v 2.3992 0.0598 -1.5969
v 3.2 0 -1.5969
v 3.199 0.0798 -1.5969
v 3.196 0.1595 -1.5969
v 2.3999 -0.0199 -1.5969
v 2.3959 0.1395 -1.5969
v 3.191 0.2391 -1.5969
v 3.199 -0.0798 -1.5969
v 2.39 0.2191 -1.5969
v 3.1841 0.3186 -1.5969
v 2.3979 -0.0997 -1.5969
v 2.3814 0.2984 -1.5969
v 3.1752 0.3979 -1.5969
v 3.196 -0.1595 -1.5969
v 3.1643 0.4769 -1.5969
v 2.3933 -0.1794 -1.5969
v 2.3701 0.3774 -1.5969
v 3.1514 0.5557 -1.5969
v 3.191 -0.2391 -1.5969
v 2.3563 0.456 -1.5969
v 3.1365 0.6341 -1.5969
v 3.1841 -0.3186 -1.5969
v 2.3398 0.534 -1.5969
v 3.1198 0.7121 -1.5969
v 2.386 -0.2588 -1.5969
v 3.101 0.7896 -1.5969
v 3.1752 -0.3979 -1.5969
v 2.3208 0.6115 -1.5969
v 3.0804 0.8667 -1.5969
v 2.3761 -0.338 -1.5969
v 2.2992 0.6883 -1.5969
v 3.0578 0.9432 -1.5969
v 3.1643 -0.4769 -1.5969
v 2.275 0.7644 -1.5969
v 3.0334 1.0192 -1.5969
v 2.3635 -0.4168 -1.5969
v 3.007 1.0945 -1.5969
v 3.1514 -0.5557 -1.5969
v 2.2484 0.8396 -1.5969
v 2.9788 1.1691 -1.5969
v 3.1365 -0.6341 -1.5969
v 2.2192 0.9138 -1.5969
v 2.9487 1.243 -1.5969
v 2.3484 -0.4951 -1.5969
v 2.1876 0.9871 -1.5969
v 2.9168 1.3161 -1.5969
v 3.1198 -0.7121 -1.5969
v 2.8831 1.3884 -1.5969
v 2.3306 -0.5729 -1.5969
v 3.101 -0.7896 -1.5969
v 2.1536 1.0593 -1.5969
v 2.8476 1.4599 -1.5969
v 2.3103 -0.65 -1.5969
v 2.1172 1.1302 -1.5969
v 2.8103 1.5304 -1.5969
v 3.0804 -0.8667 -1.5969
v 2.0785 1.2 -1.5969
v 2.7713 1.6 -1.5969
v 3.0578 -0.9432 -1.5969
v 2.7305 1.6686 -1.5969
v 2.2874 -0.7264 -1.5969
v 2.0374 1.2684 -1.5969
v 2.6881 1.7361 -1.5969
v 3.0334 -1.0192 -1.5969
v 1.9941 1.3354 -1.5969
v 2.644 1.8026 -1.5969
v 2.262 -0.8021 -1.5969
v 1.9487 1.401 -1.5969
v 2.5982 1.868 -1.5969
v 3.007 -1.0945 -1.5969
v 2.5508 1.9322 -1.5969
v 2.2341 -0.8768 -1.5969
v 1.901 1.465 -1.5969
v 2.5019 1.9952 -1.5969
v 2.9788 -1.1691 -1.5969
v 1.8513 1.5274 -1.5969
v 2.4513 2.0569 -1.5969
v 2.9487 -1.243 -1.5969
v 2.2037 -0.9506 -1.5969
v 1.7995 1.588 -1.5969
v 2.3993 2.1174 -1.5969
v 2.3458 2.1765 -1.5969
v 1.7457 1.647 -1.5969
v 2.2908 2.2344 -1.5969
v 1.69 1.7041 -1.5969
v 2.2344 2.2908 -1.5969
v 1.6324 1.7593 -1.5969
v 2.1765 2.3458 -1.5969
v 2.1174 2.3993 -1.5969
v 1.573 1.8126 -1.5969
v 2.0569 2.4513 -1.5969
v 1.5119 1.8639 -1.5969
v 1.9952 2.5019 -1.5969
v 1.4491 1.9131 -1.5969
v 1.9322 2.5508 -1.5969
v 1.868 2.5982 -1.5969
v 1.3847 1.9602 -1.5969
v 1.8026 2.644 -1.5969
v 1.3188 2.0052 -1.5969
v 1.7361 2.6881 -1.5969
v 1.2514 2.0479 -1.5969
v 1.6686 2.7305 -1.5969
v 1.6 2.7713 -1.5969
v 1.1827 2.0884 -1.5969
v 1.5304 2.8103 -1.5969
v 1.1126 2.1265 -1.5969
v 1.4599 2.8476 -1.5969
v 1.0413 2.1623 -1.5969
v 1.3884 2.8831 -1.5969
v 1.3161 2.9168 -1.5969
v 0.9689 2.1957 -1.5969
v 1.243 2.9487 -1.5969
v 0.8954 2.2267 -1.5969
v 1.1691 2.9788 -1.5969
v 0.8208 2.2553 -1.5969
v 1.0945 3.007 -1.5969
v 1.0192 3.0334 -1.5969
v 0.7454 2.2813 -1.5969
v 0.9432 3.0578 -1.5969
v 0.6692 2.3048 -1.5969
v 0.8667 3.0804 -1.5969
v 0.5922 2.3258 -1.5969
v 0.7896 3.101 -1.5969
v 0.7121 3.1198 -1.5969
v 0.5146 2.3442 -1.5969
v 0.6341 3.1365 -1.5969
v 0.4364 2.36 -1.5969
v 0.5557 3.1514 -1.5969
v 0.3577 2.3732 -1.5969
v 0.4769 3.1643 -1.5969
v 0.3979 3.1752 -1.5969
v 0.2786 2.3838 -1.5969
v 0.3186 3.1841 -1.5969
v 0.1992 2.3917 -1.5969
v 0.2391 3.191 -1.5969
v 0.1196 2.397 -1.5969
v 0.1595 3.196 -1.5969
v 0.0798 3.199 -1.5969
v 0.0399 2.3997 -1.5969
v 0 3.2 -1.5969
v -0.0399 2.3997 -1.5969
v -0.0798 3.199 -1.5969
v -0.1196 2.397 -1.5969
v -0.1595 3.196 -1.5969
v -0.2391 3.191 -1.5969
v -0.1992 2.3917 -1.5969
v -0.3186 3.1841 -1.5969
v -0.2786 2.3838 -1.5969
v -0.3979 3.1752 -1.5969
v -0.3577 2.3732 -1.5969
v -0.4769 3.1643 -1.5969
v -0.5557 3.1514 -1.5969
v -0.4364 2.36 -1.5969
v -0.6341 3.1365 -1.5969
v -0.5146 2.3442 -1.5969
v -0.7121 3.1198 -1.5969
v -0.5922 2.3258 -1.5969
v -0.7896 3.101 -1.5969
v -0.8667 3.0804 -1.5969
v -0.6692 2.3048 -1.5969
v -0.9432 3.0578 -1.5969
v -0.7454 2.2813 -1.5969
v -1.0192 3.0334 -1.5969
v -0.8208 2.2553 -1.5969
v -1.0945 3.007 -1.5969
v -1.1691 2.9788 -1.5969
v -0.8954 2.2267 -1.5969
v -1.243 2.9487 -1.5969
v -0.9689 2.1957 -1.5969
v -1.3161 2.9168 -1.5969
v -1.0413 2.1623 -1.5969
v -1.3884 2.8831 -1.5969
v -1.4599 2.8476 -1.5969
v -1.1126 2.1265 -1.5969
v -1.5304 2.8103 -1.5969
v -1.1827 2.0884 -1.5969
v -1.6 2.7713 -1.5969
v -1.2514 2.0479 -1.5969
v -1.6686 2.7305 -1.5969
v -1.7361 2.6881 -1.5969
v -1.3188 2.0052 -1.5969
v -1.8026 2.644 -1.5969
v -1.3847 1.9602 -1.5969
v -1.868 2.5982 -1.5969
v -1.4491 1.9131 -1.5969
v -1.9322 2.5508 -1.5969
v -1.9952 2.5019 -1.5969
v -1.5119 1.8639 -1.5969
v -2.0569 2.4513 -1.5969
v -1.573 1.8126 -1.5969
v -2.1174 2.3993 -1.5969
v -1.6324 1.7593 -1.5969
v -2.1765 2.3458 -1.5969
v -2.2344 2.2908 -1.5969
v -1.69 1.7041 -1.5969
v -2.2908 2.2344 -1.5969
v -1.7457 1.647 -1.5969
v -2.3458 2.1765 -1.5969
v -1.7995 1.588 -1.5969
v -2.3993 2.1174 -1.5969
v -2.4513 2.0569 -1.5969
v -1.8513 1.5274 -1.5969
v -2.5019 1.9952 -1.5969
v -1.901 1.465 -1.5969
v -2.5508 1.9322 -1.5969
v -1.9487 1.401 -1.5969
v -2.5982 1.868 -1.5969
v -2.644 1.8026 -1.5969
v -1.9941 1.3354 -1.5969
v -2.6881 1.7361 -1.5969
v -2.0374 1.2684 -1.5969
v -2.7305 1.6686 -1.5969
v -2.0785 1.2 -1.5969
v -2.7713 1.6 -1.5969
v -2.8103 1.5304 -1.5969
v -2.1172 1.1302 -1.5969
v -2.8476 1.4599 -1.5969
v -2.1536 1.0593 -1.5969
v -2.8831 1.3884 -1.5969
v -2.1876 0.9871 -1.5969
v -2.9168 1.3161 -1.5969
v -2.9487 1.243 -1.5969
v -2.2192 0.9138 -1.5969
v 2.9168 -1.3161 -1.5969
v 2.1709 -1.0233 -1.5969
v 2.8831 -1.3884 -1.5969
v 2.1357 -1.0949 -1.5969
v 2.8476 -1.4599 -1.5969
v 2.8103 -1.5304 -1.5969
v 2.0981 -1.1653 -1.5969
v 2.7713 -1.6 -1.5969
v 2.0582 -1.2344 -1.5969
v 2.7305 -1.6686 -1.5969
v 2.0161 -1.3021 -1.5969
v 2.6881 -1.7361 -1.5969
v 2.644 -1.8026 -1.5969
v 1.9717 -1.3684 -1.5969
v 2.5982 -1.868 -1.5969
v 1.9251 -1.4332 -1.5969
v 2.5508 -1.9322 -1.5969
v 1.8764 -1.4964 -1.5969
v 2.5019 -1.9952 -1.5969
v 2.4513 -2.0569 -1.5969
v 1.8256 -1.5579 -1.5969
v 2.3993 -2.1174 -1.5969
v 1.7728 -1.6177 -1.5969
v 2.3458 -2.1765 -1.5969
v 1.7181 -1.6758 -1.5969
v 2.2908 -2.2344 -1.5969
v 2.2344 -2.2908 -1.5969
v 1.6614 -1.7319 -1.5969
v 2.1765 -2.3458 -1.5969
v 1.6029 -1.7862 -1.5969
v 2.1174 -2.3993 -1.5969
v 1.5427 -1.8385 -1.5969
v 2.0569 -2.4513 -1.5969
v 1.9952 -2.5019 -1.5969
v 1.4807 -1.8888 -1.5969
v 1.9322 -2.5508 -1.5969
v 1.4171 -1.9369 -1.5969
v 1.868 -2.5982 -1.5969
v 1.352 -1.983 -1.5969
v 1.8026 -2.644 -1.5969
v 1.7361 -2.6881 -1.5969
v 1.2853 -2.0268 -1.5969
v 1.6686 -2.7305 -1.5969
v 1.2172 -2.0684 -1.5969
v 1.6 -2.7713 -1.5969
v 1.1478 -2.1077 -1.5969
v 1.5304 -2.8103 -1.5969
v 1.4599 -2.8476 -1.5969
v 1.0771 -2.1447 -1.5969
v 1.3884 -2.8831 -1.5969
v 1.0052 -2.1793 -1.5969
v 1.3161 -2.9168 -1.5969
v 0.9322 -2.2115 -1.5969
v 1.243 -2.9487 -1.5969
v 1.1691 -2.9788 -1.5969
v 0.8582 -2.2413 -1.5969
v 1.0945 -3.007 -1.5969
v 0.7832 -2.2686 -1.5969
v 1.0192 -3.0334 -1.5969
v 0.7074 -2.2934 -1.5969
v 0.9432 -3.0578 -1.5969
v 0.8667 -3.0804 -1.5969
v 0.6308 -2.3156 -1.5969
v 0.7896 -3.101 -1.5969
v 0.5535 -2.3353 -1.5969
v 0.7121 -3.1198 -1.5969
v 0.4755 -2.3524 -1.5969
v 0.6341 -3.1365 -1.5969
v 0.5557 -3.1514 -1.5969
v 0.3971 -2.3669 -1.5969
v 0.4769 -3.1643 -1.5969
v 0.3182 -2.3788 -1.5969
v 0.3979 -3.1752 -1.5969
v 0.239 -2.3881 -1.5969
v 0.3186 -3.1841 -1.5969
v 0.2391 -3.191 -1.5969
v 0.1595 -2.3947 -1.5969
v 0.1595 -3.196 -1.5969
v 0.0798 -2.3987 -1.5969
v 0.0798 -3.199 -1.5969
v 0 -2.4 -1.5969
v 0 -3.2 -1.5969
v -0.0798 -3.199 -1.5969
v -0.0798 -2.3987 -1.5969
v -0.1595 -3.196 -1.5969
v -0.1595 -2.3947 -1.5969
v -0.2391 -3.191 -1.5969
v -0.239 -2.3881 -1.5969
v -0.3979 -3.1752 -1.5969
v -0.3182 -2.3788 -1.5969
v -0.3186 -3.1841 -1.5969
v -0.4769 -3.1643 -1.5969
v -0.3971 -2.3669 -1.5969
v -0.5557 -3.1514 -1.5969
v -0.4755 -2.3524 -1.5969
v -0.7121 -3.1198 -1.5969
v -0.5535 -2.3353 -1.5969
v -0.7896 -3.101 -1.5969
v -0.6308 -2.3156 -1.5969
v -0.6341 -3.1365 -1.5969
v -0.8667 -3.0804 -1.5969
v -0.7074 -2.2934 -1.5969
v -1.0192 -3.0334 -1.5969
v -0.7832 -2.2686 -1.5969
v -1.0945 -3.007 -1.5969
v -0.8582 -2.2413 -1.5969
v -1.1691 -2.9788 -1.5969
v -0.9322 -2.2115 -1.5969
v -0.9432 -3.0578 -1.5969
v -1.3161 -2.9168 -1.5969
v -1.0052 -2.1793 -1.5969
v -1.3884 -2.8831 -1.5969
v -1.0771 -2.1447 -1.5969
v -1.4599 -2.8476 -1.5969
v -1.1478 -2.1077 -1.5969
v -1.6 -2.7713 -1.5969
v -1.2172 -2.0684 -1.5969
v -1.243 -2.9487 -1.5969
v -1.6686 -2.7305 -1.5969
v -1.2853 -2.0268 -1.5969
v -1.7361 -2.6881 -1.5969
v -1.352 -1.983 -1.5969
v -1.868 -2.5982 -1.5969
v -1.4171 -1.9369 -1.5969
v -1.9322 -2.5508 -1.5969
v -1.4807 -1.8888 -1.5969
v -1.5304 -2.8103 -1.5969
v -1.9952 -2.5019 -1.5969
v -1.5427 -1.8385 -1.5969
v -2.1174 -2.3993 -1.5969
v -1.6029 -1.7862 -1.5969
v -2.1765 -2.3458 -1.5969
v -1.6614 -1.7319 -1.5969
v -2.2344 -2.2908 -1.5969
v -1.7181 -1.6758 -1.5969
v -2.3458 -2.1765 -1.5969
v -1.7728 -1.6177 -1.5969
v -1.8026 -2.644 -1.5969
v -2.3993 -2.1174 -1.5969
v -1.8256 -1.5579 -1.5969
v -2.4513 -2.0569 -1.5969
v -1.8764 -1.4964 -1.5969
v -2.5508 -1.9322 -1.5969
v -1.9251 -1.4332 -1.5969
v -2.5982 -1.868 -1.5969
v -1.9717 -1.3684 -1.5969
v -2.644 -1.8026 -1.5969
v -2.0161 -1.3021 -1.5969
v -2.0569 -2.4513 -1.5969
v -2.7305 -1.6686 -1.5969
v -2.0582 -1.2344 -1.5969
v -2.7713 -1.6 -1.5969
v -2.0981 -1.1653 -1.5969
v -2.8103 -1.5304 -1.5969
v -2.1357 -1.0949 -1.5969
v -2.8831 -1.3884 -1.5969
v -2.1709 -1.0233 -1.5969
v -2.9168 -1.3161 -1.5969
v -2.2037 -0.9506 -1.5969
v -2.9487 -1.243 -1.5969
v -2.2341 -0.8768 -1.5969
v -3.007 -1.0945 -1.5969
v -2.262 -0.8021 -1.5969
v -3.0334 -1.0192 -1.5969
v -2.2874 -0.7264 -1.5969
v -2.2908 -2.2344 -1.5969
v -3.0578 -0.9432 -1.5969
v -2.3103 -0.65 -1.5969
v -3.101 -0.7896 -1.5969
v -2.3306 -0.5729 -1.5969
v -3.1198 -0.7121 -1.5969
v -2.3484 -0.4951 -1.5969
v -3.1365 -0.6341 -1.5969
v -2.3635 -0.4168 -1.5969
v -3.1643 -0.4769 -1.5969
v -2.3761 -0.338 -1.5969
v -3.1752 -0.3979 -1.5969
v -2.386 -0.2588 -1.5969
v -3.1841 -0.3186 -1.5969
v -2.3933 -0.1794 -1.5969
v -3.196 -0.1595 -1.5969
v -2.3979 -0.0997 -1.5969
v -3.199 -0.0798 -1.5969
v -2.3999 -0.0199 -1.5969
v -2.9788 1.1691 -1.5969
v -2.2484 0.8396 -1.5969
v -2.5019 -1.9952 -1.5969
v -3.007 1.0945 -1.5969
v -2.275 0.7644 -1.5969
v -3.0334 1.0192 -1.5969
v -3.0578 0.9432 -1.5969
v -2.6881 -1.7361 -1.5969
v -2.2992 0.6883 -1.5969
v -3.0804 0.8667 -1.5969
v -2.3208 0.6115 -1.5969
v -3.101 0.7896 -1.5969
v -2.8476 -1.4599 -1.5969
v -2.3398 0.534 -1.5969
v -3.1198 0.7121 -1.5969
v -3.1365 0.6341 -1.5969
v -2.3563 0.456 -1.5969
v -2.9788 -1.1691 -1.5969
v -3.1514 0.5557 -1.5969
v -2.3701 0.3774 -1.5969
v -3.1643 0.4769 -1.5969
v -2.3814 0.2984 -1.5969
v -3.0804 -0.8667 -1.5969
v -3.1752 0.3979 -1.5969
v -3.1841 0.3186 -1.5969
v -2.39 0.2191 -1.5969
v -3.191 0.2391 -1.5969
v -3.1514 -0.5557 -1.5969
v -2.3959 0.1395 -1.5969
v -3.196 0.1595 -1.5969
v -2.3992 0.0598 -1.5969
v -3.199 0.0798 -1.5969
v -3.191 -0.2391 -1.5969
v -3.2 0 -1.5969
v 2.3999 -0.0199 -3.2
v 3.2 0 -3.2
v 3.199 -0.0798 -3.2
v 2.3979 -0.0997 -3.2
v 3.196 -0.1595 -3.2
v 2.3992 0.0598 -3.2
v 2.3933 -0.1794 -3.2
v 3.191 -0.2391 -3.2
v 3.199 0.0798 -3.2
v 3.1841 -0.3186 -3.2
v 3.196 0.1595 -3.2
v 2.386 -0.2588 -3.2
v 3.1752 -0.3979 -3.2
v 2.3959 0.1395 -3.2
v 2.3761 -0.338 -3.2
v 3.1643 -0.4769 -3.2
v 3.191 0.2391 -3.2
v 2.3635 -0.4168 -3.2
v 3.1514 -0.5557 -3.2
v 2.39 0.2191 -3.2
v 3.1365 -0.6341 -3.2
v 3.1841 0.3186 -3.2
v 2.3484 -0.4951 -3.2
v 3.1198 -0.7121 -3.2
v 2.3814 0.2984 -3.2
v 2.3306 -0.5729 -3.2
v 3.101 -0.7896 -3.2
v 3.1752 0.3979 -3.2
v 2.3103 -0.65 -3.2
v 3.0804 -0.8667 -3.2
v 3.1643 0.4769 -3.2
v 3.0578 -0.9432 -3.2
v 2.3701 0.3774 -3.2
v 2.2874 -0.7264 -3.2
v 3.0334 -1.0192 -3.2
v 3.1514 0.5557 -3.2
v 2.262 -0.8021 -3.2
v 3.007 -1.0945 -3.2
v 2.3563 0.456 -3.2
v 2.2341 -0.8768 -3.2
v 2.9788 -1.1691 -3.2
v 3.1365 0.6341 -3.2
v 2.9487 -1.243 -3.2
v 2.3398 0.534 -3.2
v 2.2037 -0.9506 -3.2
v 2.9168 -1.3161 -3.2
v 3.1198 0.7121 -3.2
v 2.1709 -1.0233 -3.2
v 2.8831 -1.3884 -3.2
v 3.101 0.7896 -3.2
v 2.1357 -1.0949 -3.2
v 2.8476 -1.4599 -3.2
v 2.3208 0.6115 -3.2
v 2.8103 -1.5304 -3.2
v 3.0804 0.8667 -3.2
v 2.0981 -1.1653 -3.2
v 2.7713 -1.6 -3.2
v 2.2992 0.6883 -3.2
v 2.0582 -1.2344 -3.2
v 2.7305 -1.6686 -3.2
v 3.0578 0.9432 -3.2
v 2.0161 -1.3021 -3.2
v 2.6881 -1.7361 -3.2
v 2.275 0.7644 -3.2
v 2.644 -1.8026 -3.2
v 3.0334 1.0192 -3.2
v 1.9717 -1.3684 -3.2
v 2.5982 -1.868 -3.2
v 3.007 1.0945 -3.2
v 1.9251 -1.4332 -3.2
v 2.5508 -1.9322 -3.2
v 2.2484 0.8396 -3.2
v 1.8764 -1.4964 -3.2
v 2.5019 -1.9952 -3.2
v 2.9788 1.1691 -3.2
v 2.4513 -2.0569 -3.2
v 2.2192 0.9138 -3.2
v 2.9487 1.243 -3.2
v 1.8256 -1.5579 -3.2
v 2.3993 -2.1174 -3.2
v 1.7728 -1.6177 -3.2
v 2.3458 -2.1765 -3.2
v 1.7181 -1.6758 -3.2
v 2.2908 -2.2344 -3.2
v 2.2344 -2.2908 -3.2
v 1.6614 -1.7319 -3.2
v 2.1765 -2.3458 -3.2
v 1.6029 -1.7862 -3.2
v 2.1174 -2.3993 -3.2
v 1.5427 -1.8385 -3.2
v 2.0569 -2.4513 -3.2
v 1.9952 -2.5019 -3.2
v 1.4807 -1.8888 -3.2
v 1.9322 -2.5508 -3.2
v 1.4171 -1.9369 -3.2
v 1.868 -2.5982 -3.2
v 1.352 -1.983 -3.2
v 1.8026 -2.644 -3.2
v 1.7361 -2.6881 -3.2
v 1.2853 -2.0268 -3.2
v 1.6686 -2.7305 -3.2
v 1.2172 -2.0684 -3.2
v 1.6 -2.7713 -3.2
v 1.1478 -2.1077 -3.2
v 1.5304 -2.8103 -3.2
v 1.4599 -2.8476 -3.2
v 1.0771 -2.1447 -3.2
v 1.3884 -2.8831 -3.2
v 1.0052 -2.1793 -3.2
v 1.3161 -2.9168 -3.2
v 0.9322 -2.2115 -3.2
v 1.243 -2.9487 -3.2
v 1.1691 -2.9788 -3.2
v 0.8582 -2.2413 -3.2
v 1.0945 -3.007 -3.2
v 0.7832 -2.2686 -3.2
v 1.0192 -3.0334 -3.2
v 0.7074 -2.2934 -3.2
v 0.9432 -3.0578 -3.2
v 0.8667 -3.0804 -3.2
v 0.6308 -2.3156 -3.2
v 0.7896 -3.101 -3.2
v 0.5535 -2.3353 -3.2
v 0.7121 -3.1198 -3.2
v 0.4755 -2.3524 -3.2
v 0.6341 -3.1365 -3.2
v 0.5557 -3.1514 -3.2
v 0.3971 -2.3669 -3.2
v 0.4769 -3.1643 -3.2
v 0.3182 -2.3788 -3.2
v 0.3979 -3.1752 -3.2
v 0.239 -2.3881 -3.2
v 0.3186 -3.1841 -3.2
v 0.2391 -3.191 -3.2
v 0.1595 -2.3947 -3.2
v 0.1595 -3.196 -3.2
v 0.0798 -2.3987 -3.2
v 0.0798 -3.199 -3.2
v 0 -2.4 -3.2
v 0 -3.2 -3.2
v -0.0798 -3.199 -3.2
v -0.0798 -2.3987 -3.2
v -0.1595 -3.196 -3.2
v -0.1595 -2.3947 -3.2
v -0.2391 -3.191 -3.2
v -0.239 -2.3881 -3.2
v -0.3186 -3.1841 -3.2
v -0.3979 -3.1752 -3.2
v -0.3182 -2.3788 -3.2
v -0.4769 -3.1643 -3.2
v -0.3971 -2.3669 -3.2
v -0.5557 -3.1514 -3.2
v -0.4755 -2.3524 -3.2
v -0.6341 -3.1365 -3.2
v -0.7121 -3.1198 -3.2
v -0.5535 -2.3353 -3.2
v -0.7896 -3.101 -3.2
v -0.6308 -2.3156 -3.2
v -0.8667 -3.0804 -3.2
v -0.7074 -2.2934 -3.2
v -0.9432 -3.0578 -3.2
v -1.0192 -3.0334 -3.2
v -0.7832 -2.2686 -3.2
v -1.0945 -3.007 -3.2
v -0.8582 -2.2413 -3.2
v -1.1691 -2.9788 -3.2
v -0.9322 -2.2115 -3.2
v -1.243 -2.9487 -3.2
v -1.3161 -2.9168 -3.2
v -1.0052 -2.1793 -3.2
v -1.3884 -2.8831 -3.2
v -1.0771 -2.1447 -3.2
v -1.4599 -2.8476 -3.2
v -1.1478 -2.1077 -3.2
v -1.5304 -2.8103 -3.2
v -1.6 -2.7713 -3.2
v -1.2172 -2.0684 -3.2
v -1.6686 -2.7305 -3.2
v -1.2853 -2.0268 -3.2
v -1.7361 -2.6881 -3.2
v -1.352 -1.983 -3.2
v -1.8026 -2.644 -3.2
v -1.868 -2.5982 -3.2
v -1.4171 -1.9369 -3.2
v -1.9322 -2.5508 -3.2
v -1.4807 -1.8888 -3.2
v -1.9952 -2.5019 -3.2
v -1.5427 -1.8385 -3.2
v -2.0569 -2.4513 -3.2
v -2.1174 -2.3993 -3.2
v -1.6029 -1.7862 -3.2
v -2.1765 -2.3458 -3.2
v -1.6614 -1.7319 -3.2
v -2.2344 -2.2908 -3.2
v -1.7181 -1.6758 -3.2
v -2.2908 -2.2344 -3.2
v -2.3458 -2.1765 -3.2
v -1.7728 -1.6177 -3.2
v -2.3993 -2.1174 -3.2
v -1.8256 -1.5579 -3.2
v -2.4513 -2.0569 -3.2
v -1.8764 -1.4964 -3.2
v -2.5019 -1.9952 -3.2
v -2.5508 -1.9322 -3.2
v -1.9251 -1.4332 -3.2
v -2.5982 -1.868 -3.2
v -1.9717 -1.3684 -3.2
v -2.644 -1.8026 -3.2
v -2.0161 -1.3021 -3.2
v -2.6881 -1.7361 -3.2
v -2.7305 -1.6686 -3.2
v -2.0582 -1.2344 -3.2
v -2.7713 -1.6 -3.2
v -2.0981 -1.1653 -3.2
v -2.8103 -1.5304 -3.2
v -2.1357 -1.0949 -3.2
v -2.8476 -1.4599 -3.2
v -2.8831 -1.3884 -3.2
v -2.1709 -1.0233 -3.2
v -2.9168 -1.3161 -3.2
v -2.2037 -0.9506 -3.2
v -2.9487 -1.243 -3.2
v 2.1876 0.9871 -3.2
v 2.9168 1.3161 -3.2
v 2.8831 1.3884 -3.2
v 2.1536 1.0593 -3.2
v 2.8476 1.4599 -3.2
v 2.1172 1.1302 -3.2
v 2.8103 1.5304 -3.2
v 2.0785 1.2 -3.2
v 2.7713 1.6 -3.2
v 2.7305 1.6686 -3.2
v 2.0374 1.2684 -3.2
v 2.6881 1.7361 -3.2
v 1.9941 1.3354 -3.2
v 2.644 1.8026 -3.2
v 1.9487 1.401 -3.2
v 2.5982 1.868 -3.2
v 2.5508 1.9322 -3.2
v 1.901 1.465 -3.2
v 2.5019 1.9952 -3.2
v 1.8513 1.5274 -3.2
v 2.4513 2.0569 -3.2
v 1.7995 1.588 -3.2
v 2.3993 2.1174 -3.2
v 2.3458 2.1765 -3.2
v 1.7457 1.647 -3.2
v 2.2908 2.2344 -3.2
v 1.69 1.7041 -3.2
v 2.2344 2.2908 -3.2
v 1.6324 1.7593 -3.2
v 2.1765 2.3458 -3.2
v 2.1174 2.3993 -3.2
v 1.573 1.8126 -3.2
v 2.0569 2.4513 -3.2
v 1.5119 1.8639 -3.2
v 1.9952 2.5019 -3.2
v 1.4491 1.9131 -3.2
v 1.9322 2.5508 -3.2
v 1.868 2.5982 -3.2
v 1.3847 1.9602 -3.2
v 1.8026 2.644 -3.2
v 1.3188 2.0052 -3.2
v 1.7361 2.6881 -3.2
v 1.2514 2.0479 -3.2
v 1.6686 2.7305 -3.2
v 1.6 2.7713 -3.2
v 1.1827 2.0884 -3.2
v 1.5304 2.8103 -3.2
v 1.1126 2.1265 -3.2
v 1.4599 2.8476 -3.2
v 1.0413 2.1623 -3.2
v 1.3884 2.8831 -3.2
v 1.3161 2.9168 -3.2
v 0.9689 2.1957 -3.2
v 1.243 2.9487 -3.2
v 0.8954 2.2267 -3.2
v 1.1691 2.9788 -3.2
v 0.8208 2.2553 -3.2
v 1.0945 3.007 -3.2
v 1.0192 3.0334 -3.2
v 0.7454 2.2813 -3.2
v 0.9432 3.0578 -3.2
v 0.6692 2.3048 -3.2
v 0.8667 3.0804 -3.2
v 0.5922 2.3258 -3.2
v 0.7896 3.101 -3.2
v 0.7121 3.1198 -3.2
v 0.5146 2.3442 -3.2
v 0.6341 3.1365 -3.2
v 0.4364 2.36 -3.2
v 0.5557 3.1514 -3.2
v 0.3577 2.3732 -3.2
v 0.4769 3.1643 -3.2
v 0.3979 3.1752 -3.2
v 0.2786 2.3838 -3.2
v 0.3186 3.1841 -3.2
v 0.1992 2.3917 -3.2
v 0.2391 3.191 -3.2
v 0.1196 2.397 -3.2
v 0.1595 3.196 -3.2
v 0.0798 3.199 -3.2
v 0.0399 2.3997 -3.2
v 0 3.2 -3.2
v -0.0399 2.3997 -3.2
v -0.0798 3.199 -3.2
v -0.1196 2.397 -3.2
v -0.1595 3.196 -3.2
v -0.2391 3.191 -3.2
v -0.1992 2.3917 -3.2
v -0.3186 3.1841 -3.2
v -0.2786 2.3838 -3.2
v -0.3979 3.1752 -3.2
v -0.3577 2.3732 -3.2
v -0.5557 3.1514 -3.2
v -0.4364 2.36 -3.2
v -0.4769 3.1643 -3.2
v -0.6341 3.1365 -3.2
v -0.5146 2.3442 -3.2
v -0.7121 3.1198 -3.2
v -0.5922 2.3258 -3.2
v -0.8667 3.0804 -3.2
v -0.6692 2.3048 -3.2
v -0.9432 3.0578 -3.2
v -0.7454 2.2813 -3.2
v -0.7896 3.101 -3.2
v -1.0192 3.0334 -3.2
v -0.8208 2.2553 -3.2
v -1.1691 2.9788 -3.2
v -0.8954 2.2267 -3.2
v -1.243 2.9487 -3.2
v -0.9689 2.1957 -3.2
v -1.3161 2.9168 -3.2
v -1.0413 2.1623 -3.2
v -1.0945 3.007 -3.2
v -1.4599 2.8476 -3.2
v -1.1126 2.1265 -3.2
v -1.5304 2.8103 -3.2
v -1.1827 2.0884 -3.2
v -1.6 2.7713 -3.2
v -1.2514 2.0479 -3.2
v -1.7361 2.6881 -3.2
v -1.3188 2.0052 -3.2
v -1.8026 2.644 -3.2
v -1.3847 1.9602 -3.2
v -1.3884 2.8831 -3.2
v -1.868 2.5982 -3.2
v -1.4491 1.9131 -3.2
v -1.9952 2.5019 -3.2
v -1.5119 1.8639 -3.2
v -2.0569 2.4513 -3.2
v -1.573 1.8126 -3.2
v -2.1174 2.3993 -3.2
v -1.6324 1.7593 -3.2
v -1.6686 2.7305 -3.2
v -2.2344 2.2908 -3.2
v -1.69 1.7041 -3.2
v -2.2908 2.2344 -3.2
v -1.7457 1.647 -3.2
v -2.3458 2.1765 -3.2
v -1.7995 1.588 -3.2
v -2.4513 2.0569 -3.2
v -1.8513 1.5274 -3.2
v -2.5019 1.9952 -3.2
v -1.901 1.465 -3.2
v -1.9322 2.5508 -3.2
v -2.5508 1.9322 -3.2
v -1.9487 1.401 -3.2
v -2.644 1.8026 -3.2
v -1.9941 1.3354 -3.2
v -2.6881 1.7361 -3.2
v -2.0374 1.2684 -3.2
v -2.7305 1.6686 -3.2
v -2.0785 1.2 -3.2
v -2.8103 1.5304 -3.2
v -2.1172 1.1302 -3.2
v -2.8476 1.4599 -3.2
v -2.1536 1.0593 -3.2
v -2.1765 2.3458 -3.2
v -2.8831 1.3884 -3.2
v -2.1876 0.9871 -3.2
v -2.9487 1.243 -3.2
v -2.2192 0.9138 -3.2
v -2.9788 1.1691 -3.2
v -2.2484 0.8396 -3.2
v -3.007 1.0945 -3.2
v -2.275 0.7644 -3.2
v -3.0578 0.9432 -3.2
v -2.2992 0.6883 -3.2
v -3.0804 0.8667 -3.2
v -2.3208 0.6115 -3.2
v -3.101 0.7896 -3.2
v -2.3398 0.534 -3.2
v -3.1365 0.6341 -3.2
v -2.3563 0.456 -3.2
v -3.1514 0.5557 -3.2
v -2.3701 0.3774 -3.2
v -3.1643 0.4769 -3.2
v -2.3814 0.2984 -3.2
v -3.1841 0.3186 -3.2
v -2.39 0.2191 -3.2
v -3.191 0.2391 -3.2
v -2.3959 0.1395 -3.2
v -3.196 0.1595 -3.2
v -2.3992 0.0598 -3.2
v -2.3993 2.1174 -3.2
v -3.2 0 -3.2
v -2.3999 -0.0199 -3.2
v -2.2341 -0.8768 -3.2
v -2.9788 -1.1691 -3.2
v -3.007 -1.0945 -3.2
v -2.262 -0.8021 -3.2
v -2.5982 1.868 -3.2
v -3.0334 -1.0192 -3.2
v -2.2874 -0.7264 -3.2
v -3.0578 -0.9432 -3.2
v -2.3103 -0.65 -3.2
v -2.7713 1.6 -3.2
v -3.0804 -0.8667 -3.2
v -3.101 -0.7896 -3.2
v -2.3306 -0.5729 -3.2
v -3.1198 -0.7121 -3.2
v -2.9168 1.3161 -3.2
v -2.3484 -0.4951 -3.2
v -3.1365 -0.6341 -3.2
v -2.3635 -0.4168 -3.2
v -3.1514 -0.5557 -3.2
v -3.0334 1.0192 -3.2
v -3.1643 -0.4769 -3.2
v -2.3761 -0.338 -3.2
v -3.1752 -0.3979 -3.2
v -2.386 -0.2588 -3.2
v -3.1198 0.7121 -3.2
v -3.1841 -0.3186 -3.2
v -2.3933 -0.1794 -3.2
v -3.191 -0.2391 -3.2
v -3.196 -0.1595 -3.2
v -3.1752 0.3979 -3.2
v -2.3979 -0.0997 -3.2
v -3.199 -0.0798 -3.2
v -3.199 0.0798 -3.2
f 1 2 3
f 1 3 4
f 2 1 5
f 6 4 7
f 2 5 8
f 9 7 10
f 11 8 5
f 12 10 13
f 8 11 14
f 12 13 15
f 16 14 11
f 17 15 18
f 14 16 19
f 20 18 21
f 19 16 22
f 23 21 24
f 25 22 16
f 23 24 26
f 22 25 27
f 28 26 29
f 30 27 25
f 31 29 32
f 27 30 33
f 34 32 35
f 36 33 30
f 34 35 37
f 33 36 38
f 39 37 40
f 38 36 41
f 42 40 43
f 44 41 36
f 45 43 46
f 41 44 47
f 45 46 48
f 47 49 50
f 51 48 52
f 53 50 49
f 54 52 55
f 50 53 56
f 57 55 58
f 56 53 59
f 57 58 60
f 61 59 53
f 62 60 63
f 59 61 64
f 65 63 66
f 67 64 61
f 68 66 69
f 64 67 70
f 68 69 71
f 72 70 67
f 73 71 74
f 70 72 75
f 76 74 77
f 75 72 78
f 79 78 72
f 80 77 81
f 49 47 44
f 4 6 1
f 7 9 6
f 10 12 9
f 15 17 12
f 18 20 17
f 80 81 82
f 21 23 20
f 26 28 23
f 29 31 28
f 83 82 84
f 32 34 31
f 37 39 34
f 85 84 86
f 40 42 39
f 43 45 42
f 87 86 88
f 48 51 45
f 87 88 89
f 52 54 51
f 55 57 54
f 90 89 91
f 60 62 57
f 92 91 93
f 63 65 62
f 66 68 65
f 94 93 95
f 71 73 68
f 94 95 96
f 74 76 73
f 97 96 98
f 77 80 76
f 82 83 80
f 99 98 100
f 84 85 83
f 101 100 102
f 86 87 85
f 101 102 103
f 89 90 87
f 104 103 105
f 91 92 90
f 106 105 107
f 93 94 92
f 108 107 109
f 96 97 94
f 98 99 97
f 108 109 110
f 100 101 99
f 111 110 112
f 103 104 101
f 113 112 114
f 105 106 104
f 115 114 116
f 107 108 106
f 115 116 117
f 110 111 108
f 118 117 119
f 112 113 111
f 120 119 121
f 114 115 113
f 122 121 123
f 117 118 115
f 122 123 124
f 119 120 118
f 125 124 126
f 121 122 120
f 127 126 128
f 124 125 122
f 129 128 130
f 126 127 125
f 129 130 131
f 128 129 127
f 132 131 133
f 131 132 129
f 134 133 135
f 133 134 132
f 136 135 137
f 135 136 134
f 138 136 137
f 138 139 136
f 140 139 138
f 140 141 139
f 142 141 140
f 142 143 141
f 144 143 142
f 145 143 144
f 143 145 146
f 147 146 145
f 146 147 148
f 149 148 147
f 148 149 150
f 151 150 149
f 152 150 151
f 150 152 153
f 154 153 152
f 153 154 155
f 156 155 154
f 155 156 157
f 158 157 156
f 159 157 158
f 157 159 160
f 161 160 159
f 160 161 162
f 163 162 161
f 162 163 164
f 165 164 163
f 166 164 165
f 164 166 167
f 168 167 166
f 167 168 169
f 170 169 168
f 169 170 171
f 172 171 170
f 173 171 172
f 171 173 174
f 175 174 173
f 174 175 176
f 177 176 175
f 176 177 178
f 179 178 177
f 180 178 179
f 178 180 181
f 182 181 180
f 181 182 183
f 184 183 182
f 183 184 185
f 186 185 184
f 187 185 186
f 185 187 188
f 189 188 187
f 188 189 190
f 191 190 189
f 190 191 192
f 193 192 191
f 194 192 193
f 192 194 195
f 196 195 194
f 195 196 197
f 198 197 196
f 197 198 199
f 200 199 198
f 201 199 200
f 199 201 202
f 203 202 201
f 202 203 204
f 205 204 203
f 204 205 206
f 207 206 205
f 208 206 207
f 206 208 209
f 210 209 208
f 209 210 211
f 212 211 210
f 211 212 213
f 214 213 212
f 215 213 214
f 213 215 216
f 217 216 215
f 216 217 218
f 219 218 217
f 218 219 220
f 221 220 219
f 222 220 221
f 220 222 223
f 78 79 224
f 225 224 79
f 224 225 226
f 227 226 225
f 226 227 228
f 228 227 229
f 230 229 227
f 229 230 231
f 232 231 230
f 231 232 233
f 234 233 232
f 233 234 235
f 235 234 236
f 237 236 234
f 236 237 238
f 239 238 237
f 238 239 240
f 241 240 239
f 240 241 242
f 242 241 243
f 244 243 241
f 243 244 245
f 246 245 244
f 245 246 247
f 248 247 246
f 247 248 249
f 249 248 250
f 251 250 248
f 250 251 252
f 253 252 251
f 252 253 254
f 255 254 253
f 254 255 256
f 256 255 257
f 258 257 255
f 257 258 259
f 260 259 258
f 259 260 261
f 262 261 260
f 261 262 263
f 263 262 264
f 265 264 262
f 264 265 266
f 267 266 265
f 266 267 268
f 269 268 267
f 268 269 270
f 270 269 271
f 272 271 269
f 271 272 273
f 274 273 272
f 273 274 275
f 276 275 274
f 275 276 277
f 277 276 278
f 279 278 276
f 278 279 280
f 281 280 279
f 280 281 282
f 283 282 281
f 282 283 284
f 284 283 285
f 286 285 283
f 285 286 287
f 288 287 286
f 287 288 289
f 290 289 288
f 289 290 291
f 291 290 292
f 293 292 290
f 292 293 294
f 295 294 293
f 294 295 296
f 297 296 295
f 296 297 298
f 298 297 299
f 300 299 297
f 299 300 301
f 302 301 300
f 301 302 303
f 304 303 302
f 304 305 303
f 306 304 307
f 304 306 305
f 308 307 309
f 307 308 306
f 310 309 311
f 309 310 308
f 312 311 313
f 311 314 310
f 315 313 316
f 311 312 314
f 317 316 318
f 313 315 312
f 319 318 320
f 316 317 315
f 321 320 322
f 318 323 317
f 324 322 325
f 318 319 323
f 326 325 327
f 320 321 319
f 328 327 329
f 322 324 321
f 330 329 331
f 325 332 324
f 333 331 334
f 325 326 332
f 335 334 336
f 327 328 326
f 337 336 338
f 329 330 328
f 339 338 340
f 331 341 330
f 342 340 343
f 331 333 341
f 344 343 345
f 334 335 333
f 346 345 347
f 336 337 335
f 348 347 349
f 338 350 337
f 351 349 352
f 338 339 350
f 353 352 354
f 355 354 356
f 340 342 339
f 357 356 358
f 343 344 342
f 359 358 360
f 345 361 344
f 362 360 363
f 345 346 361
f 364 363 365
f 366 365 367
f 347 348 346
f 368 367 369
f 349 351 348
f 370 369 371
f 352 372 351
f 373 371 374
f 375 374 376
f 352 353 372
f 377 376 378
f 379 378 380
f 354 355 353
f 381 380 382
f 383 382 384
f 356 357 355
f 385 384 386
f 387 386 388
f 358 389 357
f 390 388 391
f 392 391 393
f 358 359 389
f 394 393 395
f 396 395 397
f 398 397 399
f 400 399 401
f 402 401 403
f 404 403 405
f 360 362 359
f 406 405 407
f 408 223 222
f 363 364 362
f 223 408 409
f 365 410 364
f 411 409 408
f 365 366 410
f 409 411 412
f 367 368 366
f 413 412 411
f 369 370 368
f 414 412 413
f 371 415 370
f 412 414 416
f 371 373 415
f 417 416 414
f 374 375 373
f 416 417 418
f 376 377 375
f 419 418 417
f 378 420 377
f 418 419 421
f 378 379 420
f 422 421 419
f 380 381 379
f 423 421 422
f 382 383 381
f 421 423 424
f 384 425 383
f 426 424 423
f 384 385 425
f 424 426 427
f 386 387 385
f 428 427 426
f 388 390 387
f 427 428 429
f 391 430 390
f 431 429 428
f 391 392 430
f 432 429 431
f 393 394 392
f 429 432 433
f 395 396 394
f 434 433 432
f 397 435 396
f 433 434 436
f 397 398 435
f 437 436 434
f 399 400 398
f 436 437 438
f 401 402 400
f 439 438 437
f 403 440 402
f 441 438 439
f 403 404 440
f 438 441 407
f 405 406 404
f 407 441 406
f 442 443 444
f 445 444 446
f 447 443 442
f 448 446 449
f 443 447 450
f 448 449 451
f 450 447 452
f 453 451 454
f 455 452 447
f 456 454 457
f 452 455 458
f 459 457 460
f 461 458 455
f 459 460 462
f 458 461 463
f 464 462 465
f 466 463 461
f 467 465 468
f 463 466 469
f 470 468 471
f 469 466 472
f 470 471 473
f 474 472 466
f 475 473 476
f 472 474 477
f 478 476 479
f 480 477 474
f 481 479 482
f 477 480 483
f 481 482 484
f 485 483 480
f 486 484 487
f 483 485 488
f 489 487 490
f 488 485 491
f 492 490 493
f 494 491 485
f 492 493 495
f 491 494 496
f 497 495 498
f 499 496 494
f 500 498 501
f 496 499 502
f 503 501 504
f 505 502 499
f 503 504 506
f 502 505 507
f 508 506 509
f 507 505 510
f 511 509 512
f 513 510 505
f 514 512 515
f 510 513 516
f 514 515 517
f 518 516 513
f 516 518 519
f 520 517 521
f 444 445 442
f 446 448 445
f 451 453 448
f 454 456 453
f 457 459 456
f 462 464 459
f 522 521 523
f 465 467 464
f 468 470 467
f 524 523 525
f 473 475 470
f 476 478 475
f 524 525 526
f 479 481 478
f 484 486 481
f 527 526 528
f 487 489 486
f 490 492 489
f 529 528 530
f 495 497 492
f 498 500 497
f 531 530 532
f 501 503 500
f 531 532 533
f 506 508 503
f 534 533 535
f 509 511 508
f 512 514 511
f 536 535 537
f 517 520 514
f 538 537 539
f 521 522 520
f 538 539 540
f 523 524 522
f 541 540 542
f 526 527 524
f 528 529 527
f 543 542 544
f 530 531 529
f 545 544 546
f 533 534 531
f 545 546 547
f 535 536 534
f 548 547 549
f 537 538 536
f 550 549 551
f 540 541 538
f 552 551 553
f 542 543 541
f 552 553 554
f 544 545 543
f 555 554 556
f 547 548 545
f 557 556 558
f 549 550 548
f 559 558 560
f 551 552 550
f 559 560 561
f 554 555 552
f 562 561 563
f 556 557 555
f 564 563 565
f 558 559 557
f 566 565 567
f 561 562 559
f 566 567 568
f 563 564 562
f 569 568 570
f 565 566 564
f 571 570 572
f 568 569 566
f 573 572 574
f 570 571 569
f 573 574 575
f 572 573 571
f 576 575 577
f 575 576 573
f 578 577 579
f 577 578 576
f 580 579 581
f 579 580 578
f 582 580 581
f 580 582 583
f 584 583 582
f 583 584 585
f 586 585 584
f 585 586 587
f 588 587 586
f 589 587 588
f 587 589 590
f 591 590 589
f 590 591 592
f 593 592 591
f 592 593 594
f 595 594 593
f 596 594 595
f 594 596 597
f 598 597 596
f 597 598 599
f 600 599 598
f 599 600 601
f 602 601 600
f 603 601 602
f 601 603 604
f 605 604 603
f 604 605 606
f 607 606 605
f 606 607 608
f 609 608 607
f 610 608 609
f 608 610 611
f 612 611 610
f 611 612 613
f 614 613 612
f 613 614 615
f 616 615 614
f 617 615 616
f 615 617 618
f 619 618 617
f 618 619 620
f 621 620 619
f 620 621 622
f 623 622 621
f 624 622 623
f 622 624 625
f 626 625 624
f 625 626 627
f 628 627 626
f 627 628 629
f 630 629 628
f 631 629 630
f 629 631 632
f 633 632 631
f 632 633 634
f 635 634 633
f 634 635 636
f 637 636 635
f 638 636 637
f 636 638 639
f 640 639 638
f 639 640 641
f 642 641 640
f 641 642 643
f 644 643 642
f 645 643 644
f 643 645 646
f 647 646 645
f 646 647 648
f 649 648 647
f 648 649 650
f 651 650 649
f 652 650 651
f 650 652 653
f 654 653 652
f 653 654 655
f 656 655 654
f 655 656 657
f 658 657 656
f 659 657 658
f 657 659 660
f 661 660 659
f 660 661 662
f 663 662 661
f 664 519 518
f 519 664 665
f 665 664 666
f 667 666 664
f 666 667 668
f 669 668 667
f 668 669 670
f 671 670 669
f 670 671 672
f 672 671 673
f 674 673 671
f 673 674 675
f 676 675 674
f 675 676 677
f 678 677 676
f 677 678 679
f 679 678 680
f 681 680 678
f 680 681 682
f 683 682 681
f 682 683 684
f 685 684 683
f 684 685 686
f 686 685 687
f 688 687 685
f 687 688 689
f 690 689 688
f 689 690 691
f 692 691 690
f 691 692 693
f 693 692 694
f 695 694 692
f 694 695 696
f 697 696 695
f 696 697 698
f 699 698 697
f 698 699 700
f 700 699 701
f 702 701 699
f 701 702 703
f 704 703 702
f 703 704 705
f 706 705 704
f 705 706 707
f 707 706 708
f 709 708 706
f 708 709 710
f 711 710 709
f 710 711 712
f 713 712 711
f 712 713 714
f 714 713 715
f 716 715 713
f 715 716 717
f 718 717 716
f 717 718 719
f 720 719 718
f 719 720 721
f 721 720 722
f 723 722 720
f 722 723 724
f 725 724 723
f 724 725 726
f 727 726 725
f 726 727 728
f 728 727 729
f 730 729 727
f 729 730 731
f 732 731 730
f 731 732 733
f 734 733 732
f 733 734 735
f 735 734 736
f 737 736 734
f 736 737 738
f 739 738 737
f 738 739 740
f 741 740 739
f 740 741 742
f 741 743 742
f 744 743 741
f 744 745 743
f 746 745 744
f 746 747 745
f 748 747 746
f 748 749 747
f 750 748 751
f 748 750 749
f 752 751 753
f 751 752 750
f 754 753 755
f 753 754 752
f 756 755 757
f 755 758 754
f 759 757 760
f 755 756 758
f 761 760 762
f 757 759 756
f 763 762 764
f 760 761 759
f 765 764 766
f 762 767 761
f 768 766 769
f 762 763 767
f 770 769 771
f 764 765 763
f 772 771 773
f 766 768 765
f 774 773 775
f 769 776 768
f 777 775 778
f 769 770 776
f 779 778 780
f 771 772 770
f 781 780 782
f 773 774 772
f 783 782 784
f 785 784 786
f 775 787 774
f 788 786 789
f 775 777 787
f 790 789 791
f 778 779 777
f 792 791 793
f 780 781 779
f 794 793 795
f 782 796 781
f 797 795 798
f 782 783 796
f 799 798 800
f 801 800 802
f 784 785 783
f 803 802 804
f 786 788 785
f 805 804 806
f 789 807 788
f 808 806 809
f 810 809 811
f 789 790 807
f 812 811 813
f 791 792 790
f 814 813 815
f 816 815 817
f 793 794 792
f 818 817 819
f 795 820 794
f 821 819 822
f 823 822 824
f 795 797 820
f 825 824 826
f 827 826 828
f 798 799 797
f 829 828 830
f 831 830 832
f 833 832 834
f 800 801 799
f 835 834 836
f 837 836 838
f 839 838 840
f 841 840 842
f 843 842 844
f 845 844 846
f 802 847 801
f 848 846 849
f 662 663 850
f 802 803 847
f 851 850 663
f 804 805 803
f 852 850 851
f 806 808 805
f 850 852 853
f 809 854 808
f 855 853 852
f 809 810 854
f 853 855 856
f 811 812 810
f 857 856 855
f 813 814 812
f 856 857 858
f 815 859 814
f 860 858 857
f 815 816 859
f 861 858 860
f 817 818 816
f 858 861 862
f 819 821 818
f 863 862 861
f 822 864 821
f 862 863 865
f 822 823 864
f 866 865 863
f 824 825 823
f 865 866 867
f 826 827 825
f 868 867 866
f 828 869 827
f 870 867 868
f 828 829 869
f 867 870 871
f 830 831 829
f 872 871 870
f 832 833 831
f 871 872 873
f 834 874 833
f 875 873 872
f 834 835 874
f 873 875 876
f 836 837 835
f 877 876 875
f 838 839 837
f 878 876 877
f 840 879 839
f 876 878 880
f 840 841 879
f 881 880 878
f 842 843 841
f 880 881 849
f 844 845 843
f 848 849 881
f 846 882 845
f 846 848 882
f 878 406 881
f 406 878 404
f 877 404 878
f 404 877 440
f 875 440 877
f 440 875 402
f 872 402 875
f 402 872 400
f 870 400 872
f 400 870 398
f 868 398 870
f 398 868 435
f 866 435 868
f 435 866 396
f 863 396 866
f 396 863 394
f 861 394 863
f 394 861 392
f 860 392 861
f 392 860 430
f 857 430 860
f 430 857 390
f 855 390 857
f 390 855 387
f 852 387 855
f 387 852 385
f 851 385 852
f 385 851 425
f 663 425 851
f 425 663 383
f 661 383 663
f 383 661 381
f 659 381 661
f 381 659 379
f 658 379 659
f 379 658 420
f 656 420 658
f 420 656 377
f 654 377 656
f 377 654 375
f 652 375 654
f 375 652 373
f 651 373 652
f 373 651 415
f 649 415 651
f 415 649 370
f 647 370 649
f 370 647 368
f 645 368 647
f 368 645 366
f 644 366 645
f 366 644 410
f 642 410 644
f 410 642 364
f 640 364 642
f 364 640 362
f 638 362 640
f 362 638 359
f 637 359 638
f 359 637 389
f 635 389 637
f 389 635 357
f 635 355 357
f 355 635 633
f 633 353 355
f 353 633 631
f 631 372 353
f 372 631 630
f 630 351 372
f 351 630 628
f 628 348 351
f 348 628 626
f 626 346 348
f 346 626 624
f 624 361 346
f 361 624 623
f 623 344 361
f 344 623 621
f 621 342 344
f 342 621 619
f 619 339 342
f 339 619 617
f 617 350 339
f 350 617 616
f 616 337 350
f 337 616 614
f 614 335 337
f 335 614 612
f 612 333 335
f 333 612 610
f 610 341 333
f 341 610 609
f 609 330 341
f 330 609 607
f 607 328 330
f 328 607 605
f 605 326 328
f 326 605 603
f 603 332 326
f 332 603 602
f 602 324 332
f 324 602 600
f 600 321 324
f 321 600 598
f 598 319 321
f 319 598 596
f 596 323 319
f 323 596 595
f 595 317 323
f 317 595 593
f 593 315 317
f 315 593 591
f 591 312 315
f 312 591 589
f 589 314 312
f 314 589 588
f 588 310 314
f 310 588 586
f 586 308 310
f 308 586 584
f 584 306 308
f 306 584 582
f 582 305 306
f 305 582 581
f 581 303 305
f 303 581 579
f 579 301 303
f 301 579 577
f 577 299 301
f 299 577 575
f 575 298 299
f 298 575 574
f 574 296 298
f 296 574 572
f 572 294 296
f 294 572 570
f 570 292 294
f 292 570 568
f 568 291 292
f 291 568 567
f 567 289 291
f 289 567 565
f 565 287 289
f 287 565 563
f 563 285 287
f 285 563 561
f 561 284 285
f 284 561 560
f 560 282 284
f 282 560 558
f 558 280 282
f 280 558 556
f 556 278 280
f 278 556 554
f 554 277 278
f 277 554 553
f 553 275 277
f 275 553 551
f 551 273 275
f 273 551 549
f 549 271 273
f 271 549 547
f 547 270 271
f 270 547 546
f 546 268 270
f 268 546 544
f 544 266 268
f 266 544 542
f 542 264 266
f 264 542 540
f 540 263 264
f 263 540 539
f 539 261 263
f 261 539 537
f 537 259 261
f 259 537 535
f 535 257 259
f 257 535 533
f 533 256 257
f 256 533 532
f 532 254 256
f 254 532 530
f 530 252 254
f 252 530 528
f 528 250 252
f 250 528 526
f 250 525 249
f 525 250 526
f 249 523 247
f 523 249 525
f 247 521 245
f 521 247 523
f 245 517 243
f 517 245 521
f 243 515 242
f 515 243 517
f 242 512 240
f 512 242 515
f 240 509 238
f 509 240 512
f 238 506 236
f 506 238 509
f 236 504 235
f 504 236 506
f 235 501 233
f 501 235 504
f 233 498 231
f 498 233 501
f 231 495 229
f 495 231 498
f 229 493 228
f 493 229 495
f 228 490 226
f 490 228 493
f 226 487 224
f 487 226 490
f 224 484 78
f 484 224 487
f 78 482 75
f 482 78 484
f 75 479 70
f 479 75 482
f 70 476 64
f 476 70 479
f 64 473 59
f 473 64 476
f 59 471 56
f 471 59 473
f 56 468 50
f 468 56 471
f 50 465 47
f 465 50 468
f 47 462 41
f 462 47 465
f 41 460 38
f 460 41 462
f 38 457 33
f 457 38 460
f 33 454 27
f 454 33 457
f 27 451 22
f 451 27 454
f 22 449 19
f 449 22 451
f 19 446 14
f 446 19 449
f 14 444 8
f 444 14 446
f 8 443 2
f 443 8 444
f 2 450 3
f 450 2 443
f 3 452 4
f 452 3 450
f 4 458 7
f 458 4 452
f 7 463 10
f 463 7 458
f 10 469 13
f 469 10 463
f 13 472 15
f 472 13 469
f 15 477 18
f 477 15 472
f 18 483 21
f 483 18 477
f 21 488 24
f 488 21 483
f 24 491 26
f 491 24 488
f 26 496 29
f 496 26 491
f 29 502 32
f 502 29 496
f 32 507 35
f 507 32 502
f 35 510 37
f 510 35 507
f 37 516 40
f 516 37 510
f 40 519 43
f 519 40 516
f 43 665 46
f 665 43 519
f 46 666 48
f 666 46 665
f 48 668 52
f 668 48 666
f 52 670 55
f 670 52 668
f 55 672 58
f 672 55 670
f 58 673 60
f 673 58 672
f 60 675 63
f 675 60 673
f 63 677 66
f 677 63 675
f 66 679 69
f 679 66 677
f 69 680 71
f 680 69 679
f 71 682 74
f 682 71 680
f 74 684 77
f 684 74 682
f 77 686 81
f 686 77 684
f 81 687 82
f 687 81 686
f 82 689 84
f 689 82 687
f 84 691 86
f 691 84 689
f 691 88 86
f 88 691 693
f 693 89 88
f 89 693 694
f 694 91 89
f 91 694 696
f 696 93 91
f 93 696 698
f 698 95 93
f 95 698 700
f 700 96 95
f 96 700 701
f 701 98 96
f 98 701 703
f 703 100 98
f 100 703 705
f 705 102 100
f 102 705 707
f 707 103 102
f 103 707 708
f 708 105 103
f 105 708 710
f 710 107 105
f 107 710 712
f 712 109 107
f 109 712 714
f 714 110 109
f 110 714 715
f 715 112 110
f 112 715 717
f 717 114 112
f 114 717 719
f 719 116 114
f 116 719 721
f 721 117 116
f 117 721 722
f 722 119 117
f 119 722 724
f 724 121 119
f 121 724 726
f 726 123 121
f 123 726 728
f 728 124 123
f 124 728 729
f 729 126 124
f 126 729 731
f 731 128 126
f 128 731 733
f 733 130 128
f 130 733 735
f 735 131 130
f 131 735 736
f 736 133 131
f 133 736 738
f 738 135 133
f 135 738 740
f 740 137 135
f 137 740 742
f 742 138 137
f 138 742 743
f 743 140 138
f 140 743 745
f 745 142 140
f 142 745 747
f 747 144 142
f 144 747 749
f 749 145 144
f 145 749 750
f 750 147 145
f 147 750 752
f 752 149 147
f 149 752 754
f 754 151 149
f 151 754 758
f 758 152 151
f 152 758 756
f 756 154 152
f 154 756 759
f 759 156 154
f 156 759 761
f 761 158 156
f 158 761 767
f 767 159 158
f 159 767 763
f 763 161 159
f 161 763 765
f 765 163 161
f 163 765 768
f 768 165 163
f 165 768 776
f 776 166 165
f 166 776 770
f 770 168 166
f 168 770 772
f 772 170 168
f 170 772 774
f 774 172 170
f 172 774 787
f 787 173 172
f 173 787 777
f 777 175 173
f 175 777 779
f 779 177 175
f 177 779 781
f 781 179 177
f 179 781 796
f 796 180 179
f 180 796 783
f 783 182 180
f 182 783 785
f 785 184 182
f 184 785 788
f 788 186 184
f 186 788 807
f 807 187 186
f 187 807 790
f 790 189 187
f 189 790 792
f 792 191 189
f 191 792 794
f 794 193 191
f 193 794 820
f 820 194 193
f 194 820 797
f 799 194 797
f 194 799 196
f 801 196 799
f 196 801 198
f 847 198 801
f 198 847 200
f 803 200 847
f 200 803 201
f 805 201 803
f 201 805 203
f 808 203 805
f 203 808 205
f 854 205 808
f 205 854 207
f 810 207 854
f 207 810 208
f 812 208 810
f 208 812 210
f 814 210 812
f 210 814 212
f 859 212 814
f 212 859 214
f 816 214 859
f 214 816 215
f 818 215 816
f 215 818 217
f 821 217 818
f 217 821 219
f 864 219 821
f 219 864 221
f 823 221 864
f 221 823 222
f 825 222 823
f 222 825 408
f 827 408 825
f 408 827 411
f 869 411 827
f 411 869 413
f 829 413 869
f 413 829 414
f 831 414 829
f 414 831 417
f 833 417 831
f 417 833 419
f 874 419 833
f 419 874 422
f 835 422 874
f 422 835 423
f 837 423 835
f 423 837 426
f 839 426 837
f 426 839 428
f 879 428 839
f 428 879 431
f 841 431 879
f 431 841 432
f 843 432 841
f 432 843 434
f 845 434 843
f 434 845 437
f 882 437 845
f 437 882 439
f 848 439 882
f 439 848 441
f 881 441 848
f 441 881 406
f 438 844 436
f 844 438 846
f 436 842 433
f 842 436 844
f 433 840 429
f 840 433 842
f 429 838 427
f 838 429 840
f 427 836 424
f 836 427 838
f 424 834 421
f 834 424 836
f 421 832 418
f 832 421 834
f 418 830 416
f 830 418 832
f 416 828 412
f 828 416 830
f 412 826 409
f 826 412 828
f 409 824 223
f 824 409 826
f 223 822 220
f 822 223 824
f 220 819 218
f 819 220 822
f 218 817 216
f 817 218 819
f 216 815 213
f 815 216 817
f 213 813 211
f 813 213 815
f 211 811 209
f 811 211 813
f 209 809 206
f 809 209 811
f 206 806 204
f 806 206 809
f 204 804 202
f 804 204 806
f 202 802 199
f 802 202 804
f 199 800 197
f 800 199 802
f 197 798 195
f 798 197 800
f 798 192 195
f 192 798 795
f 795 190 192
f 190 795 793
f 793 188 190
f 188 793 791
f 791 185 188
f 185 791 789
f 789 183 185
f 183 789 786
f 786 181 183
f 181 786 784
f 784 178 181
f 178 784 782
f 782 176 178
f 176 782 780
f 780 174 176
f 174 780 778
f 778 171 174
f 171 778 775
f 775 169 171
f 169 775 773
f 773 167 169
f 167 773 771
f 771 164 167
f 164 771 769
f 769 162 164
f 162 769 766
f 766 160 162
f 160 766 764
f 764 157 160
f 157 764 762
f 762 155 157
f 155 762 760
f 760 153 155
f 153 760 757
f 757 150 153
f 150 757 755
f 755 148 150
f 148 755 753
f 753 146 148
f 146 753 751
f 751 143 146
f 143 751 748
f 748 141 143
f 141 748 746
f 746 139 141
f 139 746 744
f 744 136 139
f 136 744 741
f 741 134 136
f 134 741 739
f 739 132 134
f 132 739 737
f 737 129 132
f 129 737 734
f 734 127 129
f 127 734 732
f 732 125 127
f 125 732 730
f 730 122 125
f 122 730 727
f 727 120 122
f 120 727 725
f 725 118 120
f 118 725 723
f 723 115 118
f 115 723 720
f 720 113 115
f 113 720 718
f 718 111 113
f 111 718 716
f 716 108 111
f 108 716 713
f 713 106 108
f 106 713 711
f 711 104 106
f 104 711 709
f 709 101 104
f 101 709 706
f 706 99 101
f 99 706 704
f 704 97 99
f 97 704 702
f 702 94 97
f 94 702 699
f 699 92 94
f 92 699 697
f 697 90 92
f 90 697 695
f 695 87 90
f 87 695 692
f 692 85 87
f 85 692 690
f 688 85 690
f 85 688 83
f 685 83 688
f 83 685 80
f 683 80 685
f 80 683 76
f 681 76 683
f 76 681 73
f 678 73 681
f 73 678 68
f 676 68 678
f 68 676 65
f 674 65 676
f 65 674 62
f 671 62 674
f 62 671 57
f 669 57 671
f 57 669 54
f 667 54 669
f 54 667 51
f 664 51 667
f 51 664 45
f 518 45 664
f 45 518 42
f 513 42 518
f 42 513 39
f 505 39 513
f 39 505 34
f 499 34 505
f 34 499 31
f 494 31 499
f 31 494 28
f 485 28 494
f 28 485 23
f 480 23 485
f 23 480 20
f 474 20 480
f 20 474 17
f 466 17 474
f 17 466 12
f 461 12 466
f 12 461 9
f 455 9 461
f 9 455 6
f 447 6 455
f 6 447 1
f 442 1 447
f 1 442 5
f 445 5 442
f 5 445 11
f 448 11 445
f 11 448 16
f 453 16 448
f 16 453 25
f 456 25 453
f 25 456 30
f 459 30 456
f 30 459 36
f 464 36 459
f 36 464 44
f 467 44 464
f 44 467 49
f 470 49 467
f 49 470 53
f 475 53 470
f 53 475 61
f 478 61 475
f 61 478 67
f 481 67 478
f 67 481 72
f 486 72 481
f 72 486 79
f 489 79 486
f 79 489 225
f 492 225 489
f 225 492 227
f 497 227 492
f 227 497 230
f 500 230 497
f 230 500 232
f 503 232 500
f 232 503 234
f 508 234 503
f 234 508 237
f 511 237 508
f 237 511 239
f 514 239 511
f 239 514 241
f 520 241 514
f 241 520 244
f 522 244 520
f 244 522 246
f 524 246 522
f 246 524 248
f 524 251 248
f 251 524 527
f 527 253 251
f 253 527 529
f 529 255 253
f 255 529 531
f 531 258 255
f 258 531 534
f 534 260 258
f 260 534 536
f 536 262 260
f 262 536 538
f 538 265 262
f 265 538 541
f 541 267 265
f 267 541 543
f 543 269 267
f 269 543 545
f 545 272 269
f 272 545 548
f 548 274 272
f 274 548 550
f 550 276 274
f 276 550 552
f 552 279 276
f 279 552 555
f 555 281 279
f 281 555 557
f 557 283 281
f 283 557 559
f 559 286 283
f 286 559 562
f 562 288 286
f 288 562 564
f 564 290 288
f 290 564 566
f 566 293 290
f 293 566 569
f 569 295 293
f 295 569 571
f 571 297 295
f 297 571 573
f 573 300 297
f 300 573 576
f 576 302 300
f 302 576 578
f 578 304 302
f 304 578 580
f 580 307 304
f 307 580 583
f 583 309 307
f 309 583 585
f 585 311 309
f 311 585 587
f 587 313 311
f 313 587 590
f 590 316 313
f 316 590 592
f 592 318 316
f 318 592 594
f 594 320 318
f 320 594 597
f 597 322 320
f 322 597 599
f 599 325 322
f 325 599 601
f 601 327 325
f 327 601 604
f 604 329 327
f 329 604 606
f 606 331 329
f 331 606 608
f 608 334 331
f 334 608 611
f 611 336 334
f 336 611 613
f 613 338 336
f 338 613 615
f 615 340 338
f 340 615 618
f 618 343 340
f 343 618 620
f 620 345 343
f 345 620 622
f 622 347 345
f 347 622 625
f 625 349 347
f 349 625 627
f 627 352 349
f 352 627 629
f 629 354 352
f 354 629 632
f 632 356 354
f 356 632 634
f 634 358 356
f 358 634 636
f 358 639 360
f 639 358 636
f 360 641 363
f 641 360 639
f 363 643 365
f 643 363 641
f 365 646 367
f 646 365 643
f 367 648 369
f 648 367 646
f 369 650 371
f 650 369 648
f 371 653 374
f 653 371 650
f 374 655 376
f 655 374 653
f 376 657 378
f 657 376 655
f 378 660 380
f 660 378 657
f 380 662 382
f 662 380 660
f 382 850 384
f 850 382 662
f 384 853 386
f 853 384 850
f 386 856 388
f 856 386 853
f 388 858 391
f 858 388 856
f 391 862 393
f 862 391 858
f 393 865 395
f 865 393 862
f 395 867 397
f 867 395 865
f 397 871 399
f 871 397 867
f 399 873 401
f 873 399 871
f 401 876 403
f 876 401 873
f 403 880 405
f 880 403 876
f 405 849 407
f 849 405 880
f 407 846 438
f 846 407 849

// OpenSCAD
use <../lib.scad>
use <3068bp07.scad>
$fa=1; $fs=0.2;
function ldraw_lib__3068p07(realsolid=false) = [
// 0 ~Moved to 3068bp07
// 0 Name: 3068p07.dat
// 0 Author: [PTadmin]
// 0 !LDRAW_ORG Part UPDATE 2002-02
// 0 !LICENSE Licensed under CC BY 4.0 : see CAreadme.txt
// 
// 0 BFC CERTIFY CCW
  [0,"BFC","CERTIFY"],
  [0,"BFC","CCW"],
// 
// 0 !HISTORY 2002-04-25 [PTadmin] Official Update 2002-02
// 0 !HISTORY 2007-06-13 [PTadmin] Header formatted for Contributor Agreement
// 0 !HISTORY 2008-07-01 [PTadmin] Official Update 2008-01
// 
// 
// 1 16 0 0 0 1 0 0 0 1 0 0 0 1 3068bp07.dat
  [1,16,0,0,0,1,0,0,0,1,0,0,0,1, ldraw_lib__3068bp07(realsolid)],
];
module ldraw_lib__3068p07(step=0, col=false, unit=2/5, alt=false, line=0.2, solid=!$preview)
    makepoly(ldraw_lib__3068p07(solid), step=step, col=col, unit=unit, alt=alt, line=line, solid=solid);
ldraw_lib__3068p07(line=0.2);
